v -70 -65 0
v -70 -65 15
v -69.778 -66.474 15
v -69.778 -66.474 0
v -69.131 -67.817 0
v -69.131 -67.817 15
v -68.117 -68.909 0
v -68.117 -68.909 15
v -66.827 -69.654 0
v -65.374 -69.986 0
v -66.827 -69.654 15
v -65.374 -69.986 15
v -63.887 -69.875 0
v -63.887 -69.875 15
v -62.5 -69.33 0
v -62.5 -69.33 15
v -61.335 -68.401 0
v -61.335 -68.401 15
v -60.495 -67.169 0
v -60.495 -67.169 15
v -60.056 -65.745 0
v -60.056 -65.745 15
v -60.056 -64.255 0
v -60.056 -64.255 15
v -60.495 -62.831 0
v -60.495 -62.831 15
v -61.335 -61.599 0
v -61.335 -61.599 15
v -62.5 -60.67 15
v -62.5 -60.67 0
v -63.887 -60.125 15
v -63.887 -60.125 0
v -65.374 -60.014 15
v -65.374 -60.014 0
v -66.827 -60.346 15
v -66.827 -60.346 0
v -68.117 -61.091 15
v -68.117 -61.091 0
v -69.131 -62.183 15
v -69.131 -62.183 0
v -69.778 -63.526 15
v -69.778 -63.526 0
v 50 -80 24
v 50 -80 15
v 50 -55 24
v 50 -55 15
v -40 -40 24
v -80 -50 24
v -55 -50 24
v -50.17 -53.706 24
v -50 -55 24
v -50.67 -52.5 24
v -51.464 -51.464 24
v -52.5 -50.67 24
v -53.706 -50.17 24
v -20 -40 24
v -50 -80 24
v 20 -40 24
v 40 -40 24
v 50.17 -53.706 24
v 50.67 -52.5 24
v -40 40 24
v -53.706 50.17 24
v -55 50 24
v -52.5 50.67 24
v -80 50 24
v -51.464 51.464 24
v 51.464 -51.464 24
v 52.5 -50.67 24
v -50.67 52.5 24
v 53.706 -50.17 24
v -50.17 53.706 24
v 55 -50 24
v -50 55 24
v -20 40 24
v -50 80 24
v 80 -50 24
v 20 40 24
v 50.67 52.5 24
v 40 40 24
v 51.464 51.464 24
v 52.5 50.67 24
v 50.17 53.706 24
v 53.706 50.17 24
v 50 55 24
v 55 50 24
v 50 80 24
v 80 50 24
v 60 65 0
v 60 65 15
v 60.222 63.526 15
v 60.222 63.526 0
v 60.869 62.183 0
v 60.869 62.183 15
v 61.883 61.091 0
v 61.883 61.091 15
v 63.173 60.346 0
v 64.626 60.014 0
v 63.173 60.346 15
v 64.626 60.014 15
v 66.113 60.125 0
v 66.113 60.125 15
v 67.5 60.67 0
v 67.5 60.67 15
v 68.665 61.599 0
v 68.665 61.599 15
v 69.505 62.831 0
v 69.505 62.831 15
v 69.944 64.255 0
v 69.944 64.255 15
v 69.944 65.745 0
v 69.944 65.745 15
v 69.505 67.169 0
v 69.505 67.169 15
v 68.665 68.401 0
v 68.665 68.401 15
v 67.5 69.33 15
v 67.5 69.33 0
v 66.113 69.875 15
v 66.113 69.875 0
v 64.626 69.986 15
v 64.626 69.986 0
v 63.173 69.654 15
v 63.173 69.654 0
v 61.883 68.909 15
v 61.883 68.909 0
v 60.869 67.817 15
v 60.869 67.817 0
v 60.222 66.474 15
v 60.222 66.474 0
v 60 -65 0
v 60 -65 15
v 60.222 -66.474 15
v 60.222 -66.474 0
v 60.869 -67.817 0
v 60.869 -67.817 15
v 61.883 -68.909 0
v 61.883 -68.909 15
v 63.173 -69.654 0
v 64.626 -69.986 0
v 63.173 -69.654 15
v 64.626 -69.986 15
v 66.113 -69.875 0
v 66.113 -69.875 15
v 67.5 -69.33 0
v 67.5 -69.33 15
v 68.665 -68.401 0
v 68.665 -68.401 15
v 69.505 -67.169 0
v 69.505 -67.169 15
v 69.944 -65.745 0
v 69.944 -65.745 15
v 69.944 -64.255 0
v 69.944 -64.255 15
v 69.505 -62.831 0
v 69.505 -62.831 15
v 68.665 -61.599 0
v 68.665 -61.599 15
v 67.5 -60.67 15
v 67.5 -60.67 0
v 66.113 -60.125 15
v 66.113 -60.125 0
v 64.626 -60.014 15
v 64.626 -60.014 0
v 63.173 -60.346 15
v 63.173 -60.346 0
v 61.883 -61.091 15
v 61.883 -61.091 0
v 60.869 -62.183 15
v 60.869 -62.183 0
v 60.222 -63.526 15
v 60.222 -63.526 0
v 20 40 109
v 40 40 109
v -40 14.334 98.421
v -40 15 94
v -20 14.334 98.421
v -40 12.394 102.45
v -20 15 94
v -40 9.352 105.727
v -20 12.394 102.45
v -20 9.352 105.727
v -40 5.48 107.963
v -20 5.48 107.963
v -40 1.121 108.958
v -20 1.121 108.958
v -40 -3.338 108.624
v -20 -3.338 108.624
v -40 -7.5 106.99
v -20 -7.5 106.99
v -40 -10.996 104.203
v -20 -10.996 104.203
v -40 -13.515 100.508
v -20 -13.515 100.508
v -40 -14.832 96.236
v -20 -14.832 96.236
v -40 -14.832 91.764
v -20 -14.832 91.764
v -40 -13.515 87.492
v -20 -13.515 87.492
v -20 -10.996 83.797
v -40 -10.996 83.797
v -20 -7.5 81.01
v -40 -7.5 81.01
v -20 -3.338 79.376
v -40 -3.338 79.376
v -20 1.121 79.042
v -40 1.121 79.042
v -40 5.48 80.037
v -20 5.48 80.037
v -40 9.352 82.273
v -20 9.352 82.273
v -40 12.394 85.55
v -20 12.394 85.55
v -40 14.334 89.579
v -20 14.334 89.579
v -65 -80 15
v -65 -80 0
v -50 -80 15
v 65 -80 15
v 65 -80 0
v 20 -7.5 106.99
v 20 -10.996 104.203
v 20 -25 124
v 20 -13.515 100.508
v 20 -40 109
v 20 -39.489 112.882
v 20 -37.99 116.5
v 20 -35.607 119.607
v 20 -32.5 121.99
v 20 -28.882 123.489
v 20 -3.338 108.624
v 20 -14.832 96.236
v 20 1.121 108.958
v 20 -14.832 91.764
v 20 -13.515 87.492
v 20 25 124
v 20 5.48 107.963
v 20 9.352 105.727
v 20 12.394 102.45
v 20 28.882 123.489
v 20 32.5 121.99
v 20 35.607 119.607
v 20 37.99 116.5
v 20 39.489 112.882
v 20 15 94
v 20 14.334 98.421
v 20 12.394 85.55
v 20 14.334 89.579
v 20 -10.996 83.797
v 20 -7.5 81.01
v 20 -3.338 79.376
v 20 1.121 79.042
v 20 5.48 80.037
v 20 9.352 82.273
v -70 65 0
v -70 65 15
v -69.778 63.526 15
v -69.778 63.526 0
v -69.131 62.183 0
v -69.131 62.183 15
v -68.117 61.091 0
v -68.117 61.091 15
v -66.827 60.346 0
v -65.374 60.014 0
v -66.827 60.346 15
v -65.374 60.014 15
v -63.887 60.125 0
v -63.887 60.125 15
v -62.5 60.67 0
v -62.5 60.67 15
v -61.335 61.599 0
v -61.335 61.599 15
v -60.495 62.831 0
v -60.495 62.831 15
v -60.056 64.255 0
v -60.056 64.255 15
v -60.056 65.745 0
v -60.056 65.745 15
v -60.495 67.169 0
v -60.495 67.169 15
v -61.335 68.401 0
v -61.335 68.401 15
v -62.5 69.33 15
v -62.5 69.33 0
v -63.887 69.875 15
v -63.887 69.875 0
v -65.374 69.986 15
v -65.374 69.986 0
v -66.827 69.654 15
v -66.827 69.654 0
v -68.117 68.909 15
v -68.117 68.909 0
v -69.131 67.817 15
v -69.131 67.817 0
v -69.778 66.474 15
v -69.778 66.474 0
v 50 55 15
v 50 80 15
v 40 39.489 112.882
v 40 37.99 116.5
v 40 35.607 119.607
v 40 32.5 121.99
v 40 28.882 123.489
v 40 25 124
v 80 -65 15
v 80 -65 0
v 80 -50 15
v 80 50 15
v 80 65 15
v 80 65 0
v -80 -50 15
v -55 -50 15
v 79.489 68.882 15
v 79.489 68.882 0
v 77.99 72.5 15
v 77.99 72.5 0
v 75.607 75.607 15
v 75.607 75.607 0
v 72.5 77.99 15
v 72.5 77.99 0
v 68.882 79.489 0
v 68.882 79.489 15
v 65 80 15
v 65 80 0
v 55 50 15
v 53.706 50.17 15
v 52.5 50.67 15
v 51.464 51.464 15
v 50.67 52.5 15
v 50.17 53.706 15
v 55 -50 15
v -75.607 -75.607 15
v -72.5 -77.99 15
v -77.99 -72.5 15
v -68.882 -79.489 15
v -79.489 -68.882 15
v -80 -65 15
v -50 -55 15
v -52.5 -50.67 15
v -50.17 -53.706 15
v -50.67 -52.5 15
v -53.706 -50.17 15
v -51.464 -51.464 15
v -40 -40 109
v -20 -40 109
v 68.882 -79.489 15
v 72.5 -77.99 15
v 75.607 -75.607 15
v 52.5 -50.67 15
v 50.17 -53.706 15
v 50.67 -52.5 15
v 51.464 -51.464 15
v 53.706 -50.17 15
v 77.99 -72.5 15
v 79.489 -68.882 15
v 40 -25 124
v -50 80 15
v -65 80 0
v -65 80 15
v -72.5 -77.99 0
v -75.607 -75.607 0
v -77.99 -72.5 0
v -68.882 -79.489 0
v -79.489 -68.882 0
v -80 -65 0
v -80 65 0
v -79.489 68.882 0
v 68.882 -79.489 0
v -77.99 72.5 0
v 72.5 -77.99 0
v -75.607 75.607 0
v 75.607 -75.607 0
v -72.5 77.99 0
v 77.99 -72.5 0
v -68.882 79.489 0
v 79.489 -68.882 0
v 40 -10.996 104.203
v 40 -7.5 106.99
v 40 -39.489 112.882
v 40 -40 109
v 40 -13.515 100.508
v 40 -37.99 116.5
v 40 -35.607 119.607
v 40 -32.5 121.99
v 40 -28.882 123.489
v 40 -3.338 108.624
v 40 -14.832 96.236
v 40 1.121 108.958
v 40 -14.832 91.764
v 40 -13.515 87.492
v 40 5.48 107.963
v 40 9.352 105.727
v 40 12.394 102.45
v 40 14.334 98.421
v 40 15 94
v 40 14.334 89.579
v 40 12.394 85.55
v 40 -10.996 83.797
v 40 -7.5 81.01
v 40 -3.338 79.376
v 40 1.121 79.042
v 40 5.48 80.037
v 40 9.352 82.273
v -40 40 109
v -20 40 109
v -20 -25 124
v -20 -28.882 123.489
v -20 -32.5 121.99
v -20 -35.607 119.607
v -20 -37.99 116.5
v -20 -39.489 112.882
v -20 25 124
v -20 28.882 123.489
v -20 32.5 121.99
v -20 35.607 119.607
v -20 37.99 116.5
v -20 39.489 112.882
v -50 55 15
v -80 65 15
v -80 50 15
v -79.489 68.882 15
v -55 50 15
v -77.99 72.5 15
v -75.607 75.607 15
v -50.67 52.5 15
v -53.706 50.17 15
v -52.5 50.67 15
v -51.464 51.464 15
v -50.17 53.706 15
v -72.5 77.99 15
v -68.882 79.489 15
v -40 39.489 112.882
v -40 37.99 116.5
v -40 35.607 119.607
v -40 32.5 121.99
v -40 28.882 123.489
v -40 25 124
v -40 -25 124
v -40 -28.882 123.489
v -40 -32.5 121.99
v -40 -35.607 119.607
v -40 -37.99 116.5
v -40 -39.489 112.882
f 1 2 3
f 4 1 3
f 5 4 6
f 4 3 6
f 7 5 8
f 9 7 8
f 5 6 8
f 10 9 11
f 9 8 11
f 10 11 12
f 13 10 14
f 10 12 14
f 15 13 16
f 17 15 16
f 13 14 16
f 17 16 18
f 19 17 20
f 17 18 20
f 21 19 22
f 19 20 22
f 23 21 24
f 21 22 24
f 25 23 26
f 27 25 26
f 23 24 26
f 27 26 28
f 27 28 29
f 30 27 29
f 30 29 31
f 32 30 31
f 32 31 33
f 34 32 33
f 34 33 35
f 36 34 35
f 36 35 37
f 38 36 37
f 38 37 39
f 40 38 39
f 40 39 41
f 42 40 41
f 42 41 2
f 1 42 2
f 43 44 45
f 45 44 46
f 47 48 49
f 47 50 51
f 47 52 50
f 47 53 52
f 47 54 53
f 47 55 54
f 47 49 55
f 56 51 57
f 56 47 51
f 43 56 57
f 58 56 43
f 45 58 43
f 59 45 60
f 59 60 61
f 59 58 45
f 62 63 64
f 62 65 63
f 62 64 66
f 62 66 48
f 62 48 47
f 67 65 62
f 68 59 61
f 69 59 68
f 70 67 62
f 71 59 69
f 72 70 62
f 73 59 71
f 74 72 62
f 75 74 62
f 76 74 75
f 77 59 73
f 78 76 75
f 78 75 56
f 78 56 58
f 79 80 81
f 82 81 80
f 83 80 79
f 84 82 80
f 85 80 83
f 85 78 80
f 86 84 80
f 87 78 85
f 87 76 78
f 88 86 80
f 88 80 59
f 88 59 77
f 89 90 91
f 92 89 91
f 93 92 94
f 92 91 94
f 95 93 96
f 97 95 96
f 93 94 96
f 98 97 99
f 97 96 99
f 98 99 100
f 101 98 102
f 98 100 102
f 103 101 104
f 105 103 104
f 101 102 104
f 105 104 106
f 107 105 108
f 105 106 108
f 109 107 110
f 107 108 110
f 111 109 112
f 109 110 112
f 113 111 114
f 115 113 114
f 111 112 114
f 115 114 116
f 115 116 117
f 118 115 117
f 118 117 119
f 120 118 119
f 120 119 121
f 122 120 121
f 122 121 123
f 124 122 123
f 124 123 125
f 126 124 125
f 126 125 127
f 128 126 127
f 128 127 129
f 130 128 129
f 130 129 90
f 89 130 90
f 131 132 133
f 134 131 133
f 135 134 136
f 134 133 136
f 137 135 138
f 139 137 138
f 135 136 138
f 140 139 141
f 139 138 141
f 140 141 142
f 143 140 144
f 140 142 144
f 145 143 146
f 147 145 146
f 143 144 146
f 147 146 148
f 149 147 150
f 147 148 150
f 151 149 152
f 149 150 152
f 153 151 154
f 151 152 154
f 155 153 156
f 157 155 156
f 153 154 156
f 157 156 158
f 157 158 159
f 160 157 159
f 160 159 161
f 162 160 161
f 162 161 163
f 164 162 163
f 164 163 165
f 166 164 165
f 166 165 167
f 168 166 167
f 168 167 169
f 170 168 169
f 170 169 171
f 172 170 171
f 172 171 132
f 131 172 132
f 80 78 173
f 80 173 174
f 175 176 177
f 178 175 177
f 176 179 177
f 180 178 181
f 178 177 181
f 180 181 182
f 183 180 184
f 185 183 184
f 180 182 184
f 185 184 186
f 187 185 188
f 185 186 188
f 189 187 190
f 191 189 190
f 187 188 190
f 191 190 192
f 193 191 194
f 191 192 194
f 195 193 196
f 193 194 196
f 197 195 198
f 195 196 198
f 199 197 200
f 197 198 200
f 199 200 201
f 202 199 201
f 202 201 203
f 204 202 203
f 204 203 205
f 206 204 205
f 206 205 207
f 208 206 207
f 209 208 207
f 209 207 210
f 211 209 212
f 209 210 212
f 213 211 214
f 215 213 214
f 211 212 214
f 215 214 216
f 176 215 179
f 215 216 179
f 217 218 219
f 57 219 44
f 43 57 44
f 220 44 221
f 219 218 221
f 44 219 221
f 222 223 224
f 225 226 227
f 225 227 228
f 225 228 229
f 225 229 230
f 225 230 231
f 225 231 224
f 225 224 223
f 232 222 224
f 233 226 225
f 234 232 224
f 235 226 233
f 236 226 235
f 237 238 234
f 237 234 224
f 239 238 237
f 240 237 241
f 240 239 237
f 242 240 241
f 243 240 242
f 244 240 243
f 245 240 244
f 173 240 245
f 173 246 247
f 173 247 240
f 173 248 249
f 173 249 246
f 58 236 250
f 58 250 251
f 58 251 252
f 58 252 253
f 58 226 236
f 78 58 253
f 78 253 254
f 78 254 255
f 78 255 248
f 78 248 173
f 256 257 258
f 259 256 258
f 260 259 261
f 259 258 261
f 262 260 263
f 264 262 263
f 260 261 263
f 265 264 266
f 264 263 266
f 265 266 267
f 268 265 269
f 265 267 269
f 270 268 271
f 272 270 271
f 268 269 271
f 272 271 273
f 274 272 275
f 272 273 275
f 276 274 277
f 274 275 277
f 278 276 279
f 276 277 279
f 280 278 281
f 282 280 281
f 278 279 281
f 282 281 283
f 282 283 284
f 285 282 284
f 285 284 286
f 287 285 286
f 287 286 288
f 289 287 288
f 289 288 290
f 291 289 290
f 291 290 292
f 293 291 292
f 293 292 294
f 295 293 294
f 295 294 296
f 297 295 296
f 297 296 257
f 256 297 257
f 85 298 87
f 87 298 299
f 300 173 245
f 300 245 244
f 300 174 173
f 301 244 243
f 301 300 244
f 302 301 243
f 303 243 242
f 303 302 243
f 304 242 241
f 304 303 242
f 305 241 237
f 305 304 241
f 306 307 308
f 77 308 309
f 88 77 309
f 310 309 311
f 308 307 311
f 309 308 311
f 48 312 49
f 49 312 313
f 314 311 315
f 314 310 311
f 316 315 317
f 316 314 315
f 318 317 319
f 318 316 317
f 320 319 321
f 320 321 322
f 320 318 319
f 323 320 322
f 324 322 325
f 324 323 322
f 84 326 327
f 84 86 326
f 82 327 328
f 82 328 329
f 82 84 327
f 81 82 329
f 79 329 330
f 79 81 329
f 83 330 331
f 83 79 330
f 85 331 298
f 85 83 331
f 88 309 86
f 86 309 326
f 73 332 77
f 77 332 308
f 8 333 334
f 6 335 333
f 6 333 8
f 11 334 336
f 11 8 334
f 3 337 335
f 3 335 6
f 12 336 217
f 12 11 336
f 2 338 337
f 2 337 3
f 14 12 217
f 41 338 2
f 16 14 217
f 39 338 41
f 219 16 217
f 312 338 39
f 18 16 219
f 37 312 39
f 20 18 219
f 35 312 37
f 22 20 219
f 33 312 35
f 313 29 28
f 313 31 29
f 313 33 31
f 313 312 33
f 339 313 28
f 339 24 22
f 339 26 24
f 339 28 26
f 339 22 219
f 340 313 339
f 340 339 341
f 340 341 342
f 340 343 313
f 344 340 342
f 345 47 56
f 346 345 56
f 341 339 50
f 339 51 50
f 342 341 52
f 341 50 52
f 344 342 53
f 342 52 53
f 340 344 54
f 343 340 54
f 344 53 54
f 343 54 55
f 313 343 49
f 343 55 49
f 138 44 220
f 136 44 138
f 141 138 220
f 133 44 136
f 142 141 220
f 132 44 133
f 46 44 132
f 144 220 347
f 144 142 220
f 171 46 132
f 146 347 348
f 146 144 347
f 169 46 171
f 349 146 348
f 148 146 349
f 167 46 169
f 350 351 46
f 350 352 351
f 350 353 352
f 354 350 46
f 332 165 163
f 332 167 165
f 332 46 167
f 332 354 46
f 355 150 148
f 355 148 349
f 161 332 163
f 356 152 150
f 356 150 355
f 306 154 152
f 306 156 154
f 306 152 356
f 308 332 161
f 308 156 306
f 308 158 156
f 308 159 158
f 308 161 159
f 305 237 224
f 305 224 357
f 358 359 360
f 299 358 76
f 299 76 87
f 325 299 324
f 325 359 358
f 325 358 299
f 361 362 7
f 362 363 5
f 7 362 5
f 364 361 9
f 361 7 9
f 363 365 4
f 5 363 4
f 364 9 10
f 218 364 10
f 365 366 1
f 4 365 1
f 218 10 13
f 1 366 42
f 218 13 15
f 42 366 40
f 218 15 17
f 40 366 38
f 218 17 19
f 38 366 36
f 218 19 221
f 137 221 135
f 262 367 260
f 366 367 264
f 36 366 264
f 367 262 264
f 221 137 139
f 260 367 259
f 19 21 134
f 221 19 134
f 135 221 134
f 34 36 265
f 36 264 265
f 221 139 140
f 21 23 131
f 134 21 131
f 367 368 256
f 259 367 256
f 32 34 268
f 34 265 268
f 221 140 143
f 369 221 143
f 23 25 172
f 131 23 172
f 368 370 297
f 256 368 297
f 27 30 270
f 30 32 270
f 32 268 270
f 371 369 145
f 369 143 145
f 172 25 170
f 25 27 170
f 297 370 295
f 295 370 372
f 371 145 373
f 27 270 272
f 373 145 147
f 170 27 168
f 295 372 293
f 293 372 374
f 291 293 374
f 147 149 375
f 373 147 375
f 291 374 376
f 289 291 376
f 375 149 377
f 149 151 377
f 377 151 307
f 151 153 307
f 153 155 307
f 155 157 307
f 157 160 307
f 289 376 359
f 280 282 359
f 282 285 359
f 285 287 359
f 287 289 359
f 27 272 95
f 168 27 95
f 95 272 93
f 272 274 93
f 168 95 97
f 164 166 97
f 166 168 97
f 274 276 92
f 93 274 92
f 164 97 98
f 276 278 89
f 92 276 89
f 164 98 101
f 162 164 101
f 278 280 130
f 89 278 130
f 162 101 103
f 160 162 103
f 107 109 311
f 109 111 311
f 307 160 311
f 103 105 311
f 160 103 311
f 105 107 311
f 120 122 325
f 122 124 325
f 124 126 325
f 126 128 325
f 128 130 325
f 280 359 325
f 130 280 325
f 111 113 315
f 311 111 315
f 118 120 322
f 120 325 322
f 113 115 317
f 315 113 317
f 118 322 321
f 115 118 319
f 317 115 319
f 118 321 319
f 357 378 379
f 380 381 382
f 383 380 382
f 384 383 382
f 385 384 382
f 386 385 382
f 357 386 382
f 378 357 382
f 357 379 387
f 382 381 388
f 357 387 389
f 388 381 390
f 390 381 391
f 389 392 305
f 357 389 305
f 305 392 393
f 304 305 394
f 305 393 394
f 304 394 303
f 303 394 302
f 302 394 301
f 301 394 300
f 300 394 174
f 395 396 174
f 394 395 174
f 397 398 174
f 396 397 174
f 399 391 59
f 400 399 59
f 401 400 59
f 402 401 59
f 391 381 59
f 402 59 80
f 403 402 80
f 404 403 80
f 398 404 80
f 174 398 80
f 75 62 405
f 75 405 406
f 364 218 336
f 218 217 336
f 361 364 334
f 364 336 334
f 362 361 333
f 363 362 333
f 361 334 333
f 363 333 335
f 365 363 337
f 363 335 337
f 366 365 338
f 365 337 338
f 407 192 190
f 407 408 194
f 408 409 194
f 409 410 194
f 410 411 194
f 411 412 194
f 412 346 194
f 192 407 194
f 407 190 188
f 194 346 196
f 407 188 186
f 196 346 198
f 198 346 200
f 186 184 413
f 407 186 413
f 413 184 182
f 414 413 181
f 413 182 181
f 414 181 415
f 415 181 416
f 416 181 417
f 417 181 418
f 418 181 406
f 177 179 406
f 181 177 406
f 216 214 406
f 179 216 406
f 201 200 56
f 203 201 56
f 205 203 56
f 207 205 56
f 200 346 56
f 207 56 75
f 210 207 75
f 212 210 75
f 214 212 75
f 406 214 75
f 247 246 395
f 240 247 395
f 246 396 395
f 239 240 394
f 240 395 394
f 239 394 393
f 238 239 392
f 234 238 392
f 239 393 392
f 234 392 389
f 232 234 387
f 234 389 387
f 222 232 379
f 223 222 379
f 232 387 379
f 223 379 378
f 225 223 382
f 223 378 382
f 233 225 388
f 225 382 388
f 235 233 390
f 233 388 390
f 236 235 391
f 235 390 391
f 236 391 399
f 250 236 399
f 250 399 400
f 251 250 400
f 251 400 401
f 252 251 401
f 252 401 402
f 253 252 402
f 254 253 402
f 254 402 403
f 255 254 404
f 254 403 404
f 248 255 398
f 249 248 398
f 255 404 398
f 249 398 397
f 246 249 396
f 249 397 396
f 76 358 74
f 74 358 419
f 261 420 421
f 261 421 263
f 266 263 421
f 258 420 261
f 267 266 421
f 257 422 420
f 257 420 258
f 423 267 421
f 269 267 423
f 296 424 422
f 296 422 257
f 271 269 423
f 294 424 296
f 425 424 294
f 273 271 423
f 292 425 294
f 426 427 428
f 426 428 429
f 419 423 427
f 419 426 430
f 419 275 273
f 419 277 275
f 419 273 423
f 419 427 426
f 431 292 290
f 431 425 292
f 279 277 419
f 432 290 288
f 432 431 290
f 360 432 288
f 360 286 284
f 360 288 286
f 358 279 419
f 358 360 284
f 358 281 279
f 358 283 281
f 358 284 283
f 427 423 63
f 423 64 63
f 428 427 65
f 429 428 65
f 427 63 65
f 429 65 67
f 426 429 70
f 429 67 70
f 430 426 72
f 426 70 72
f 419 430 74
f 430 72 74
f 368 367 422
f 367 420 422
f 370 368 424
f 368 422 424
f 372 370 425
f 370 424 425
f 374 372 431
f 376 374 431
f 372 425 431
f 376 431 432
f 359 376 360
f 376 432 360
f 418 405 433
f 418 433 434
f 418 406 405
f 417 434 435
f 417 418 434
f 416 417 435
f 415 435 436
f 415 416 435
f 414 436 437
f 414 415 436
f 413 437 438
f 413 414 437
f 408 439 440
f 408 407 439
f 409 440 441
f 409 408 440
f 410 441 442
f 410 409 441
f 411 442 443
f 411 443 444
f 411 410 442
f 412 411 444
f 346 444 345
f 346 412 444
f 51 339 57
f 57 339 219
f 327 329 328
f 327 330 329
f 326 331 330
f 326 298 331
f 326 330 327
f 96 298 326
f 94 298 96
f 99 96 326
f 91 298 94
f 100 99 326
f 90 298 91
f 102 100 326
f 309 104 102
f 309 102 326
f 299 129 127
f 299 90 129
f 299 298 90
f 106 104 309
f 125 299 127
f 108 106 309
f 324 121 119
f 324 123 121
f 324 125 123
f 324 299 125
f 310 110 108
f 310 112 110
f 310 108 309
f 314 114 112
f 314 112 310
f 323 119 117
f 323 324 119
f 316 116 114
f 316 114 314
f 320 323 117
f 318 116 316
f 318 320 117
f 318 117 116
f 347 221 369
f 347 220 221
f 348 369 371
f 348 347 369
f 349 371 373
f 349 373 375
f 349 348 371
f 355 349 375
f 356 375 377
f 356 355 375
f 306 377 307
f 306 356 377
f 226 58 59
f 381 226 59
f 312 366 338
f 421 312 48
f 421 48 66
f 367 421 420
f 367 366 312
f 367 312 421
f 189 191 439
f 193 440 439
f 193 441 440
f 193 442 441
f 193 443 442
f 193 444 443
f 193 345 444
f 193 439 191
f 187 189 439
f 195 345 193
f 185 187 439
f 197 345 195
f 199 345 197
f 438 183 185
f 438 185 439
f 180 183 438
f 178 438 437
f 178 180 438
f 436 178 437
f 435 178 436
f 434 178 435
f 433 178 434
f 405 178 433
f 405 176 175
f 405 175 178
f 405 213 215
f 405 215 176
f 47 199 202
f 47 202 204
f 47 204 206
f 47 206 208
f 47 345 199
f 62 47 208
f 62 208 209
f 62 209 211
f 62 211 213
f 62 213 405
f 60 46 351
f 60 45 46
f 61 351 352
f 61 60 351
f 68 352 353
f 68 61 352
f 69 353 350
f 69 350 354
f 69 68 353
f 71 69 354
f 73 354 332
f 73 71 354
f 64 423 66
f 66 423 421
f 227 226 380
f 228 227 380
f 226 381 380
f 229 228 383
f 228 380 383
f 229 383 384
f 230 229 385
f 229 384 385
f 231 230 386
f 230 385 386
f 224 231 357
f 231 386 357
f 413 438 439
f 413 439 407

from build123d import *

# Parameters (mm, degrees)
F0_W     = 20
F0_H     = 80
F1_DEPTH = 24
F0_W_2   = 30
F0_H_2   = 30
F2_DEPTH = 15
F3_DEPTH = 124
F4_R     = 15
F5_R     = 5
F6_D     = 10
F7_R     = 15
F8_DEPTH = 52


with BuildPart() as f1:
    # F0 (on Top) → F1 (new body)
    with BuildSketch(Plane.XY):
        Polygon((-50, -80), (50, -80), (50, -50), (80, -50), (80, 50), (50, 50), (50, 80), (-50, 80), (-50, 50), (-80, 50), (-80, -50), (-50, -50), align=None)
        with Locations((-30, 0)):
            Rectangle(F0_W, F0_H, mode=Mode.SUBTRACT)
        with Locations((30, 0)):
            Rectangle(F0_W, F0_H, mode=Mode.SUBTRACT)
    extrude(amount=F1_DEPTH)

    # F0 (on Top) → F2 (join)
    with BuildSketch(Plane.XY):
        with Locations((-65, -65)):
            Rectangle(F0_W_2, F0_H_2)
        with Locations((65, -65)):
            Rectangle(F0_W_2, F0_H_2)
        with Locations((65, 65)):
            Rectangle(F0_W_2, F0_H_2)
        with Locations((-65, 65)):
            Rectangle(F0_W_2, F0_H_2)
    extrude(amount=F2_DEPTH)

    # F0 (on Top) → F3 (join)
    with BuildSketch(Plane.XY):
        with Locations((-30, 0)):
            Rectangle(F0_W, F0_H)
        with Locations((30, 0)):
            Rectangle(F0_W, F0_H)
    extrude(amount=F3_DEPTH)

    # F4
    f4_edges = [f1.edges().sort_by_distance(p)[0] for p in [
        (-30, -40, 124),
        (30, -40, 124),
        (30, 40, 124),
        (-30, 40, 124),
        (-80, -80, 7.5),
        (80, -80, 7.5),
        (-80, 80, 7.5),
        (80, 80, 7.5),
    ]]
    fillet(f4_edges, radius=F4_R)

    # F5
    f5_edges = [f1.edges().sort_by_distance(p)[0] for p in [
        (50, 50, 19.5),
        (-50, 50, 19.5),
        (-50, -50, 19.5),
        (50, -50, 19.5),
    ]]
    fillet(f5_edges, radius=F5_R)

    # F6 (through all)
    with Locations(Plane(origin=(0, 0, 0), x_dir=(1, 0, 0), z_dir=(0, 0, -1))):
        with Locations((-65, 65), (-65, -65), (65, -65), (65, 65)):
            Hole(F6_D / 2)

    # F7 (on Right) → F8 (cut, symmetric)
    with BuildSketch(Plane.YZ):
        with Locations((0, 94)):
            Circle(F7_R)
    extrude(amount=F8_DEPTH, both=True, mode=Mode.SUBTRACT)


solid = f1.part
